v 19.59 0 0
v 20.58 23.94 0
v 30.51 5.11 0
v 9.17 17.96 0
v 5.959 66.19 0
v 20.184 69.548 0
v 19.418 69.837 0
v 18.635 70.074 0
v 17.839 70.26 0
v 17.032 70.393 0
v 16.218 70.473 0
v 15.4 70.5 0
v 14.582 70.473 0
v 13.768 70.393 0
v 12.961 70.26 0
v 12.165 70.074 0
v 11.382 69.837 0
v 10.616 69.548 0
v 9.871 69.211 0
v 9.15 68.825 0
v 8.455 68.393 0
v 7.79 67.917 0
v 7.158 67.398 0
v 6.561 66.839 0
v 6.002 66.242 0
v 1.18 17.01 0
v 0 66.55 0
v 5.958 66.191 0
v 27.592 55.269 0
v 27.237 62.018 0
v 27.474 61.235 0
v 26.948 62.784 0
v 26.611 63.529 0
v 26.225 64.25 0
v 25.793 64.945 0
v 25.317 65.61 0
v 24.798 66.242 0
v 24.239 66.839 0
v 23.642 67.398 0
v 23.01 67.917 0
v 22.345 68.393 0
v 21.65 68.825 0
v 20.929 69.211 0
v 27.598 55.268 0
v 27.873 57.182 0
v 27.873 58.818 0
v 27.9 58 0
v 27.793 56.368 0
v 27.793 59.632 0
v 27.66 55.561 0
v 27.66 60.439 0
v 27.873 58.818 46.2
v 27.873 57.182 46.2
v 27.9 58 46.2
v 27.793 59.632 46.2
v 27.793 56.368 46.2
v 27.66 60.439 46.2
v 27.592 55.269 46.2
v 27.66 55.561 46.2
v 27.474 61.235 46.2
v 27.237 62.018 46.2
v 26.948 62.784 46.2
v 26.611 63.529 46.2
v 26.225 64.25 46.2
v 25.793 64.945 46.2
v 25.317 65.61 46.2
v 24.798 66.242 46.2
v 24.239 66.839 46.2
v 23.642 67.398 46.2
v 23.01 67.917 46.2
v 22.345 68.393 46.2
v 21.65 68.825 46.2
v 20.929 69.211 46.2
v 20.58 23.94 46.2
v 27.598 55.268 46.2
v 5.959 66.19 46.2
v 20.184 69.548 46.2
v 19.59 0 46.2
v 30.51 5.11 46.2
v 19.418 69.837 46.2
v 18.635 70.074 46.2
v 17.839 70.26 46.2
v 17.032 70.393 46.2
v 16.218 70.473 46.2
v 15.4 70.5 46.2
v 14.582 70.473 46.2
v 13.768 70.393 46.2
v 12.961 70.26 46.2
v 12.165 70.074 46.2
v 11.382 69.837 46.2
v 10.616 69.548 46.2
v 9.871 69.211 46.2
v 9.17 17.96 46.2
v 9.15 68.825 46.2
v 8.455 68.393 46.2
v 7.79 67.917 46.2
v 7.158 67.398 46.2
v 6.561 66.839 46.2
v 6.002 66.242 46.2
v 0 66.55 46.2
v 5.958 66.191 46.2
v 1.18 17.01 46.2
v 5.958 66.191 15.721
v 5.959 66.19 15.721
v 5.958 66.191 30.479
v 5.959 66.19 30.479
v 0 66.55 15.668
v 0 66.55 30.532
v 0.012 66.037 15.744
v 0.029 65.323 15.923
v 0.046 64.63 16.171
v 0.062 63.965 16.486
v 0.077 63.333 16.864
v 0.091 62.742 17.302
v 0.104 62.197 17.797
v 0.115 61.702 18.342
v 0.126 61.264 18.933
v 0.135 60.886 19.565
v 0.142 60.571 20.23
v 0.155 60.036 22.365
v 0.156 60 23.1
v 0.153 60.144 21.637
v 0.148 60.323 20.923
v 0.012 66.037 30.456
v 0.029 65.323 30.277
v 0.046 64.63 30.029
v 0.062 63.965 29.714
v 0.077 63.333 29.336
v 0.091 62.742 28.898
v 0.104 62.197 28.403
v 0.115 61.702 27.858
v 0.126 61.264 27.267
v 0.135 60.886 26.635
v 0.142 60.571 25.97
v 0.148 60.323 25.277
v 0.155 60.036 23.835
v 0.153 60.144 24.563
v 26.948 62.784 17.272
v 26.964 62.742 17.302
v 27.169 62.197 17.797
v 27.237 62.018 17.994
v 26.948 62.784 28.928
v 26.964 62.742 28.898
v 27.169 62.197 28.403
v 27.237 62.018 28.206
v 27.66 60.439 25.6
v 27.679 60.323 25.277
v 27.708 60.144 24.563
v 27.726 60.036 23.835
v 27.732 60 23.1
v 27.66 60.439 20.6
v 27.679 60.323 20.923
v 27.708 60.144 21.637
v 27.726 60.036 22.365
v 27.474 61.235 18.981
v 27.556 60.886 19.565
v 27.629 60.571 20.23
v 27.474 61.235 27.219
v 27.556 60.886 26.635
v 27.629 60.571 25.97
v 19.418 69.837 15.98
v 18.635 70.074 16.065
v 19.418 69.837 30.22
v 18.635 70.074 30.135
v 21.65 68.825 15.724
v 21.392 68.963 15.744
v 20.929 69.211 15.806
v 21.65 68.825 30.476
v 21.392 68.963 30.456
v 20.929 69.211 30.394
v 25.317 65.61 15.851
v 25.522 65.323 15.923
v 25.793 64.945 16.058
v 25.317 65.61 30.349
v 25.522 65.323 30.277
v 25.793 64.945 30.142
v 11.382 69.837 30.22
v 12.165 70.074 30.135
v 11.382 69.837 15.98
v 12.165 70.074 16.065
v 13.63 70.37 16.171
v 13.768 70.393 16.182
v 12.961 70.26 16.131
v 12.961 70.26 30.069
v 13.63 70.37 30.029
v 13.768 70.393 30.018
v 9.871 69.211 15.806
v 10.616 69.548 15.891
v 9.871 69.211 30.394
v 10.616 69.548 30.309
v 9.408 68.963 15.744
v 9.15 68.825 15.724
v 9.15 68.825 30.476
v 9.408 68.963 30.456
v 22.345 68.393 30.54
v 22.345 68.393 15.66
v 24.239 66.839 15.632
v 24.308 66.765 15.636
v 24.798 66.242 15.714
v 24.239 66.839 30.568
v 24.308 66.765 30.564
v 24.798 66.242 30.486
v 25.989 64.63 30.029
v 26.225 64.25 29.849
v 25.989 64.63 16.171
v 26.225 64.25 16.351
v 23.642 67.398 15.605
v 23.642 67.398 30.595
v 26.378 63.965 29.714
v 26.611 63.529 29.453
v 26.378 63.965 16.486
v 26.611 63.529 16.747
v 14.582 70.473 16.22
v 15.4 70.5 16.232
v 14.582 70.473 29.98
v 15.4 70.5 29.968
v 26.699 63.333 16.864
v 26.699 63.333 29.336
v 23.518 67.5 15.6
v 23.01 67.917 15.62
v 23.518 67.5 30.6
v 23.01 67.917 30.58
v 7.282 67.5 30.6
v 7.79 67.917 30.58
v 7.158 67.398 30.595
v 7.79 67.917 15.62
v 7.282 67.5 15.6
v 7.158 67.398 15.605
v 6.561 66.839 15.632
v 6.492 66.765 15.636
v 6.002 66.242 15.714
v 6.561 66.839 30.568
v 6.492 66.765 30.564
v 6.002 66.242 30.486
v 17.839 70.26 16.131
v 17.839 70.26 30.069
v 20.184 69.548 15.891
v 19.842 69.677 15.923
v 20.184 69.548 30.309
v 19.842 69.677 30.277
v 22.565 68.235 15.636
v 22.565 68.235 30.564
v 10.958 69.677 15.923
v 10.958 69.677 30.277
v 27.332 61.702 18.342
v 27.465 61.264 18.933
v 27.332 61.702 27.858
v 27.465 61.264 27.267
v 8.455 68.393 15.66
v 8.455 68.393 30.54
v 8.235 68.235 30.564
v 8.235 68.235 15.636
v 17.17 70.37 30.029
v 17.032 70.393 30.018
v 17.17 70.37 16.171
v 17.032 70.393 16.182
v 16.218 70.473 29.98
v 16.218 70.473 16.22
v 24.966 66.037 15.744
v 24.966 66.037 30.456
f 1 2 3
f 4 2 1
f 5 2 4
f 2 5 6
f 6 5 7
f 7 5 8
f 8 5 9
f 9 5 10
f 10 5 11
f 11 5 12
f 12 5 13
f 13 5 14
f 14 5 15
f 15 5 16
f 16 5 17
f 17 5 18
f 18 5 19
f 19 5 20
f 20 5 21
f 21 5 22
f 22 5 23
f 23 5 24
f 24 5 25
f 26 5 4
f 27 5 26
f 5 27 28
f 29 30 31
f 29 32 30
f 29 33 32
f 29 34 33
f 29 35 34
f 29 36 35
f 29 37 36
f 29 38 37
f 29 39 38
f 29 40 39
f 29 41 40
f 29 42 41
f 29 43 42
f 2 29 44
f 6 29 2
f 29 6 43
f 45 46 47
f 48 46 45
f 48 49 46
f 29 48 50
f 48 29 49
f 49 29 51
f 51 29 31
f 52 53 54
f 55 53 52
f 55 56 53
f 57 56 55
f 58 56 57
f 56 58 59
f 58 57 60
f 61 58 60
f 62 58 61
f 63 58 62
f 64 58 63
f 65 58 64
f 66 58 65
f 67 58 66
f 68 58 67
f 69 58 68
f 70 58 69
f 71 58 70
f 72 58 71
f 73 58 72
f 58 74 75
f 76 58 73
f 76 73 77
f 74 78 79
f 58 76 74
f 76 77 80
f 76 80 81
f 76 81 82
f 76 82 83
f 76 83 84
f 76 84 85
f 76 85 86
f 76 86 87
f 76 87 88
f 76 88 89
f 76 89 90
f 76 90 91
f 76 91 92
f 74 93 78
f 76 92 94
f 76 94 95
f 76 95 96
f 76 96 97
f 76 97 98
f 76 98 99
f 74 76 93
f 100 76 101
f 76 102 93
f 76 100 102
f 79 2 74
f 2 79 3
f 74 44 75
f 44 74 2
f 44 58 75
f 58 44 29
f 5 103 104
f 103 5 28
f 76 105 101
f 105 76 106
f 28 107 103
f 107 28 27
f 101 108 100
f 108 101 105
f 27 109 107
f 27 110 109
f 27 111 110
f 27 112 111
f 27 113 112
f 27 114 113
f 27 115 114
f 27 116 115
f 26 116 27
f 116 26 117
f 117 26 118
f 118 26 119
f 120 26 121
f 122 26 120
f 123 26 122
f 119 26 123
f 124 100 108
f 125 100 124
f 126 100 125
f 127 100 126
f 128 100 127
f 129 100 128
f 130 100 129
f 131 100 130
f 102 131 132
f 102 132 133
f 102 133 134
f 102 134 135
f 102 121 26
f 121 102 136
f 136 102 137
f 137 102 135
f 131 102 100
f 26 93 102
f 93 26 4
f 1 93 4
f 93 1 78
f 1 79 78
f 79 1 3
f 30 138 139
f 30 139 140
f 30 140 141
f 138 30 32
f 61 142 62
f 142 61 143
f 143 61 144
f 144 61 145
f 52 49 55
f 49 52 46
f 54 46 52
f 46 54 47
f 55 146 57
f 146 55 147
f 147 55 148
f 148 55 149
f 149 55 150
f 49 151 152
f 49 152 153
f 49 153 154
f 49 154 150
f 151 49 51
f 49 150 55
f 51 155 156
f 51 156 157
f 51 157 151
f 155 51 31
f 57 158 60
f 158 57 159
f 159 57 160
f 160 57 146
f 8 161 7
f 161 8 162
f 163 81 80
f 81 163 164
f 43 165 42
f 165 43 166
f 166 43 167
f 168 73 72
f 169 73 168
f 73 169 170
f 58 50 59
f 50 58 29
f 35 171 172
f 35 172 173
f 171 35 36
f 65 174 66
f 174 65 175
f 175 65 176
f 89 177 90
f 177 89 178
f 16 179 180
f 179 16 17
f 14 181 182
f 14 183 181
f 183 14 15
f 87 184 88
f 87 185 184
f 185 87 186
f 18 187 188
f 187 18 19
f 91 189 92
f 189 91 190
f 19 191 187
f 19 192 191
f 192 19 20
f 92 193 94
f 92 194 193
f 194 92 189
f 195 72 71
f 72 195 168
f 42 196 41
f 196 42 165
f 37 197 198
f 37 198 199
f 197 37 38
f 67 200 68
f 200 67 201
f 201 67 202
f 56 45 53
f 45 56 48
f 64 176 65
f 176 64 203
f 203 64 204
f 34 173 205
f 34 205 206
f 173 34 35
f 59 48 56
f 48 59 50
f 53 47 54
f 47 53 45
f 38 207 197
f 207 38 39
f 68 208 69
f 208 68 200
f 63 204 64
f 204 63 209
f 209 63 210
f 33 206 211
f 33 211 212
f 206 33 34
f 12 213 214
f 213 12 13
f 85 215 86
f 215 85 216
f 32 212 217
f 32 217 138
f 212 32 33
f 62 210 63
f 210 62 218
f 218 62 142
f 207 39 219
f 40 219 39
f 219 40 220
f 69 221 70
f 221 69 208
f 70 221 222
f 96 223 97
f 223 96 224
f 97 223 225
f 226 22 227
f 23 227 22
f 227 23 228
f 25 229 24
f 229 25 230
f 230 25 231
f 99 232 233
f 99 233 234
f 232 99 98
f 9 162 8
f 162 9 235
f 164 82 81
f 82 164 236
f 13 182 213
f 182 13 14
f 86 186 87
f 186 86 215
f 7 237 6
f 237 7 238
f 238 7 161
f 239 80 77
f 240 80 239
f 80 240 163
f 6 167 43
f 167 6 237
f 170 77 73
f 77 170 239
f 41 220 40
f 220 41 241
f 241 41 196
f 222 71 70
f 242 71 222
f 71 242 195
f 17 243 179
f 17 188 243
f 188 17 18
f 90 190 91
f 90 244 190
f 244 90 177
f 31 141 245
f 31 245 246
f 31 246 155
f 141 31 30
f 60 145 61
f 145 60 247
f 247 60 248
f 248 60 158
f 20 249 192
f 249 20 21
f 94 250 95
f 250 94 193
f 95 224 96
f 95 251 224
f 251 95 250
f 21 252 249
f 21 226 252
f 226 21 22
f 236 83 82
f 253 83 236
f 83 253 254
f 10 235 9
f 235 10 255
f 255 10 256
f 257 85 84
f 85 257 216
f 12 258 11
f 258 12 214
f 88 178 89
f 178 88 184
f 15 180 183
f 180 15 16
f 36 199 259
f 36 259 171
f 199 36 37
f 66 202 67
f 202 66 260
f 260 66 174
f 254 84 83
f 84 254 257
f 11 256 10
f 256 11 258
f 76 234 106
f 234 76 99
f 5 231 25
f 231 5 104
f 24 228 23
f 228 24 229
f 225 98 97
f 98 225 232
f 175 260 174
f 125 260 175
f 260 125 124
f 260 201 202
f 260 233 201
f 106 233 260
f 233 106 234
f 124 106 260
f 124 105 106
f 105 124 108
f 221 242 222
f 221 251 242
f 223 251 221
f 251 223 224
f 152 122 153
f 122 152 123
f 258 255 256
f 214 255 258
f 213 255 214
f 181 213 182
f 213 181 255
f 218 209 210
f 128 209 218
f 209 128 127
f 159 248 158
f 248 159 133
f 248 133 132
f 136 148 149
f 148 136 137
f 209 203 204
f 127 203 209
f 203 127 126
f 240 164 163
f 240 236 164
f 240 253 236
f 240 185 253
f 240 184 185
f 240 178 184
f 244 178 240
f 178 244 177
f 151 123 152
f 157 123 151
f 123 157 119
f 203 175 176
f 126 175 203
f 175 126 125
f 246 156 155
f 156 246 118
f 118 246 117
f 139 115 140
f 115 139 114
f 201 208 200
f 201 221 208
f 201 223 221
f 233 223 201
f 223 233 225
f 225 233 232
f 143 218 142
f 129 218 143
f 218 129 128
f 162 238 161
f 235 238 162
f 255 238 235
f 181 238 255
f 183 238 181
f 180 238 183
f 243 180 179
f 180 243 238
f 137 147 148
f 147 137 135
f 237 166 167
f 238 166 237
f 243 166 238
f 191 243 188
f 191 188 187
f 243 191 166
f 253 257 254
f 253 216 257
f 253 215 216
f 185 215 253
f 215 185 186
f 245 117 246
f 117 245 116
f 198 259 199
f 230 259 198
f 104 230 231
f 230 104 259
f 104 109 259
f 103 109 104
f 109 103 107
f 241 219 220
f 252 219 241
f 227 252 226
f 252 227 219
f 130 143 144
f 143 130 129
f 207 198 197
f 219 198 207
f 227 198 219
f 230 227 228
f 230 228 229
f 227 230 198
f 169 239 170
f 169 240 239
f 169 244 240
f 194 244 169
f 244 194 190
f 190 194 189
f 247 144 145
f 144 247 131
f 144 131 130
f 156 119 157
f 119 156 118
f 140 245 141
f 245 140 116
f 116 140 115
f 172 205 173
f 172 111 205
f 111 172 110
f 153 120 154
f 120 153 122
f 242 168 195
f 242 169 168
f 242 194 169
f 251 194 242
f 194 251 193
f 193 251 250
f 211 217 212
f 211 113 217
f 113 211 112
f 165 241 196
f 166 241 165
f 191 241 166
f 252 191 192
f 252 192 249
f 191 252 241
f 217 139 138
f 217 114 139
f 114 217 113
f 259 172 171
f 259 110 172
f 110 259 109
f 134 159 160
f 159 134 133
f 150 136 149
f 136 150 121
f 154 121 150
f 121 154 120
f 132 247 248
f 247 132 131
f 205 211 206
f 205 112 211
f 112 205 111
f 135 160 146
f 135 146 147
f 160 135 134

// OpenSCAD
// ============================================================================
// Parametric 3D Model with Dynamic Rear Cylindrical Arc & Cable Pass-Through
// ============================================================================

// --- User-Adjustable Parameters ---
height    = 46.2;  // Total extrusion height of the part (Z-axis, in mm)
cable_d   = 15.0;  // Diameter of the cylindrical cable channel (15 mm)
cut_depth = 10.5;  // Depth of the cable cut into the arc

// --- Rear Cylindrical Arc Settings (Adjust freely; geometry updates automatically) ---
cyl_arc_x = 15.40; // X-coordinate of the rear arc cylinder center
cyl_arc_y = 58.00; // Y-center to make plateau height difference 3.95 mm
arc_d     = 25.0;  // Outer diameter of the rear cylindrical arc (Ø 25 mm)
arc_r     = arc_d / 2.0; // Radius of the rear cylindrical arc (12.5 mm)

// --- Cable Channel Orientation ---
arc_angle = 90;    // Angular position of the cable channel along the arc (degrees)

// ============================================================================
// Automatic Geometry Calculations (Do not edit below unless changing base shape)
// ============================================================================

// Reference corner where the tapered front transitions into the right main wall
p3_x = 20.58;
p3_y = 23.94;

// 1. Calculate the exact tangent point from P3 onto the rear arc cylinder.
//    This prevents any bump or step regardless of cylinder position or diameter.
dx        = cyl_arc_x - p3_x;
dy        = cyl_arc_y - p3_y;
dist_p3_c = sqrt(dx * dx + dy * dy);     // Distance from P3 to cylinder center
base_ang  = atan2(dy, dx);               // Angle from P3 to cylinder center
alpha     = asin(arc_r / dist_p3_c);     // Tangent offset angle
tang_ang  = (base_ang - alpha) - 90;     // Normal angle to the tangent point

tan_x = cyl_arc_x + arc_r * cos(tang_ang); // X-coordinate of tangent point
tan_y = cyl_arc_y + arc_r * sin(tang_ang); // Y-coordinate of tangent point

// 2. Calculate the exact intersection between the arc cylinder and the rear plateau line.
//    Plateau line equation: y = m_plat * x + b_plat
m_plat = -0.06024;
b_plat = 66.55;

// Quadratic coefficients (A_q * x^2 + B_q * x + C_q = 0) for line-circle intersection
A_q = 1 + m_plat * m_plat;
B_q = 2 * (m_plat * (b_plat - cyl_arc_y) - cyl_arc_x);
C_q = cyl_arc_x * cyl_arc_x + pow(b_plat - cyl_arc_y, 2) - arc_r * arc_r;

// Leftmost intersection point where the plateau cleanly meets the cylinder
plat_meet_x = (-B_q - sqrt(max(0, B_q * B_q - 4 * A_q * C_q))) / (2 * A_q);
plat_meet_y = m_plat * plat_meet_x + b_plat;

// 3. Calculate the center coordinates for the cable pass-through cylinder
arc_mid_x = cyl_arc_x + arc_r * cos(arc_angle); // Outer surface point on the arc
arc_mid_y = cyl_arc_y + arc_r * sin(arc_angle);
offset_in = cut_depth - (cable_d / 2.0);        // Radial offset to achieve cut_depth
cable_x   = arc_mid_x - offset_in * cos(arc_angle);
cable_y   = arc_mid_y - offset_in * sin(arc_angle);

// ============================================================================
// 3D Solid Construction
// ============================================================================

difference() {
    // Combine the extruded main body with the true cylindrical rear arc
    union() {
        linear_extrude(height = height) {
            polygon(points = [
                [19.59,  0.00],             // P1: Front-left corner of the tapered tip
                [30.51,  5.11],             // P2: Front-right corner of the tapered tip
                [p3_x,   p3_y],             // P3: Inner corner transitioning to right wall
                [tan_x,  tan_y],            // Auto-calculated tangent point into rear cylinder
                [cyl_arc_x, cyl_arc_y],     // Cylinder center (anchors polygon inside circle)
                [plat_meet_x, plat_meet_y], // Auto-calculated junction with the rear plateau
                [ 0.00, 66.55],             // Rear-left corner of the plateau
                [ 1.18, 17.01],             // Left wall corner meeting the front step-in
                [ 9.17, 17.96]              // Inner step-in corner leading to the tapered tip
            ]);
        }

        // True cylinder forming the smooth rear arc (d = 25 mm)
        translate([cyl_arc_x, cyl_arc_y, 0])
            cylinder(h = height, d = arc_d, $fn = 96);
    }

    // Subtract the horizontal cable channel at mid-height (Z = height / 2, d = 15 mm)
    translate([cable_x, cable_y, height / 2])
        rotate([0, 0, arc_angle])           // Align radially with the chosen arc angle
        rotate([90, 0, 0])                  // Lay cylinder horizontally across the arc
        cylinder(h = 100, d = cable_d, center = true, $fn = 64);
}
